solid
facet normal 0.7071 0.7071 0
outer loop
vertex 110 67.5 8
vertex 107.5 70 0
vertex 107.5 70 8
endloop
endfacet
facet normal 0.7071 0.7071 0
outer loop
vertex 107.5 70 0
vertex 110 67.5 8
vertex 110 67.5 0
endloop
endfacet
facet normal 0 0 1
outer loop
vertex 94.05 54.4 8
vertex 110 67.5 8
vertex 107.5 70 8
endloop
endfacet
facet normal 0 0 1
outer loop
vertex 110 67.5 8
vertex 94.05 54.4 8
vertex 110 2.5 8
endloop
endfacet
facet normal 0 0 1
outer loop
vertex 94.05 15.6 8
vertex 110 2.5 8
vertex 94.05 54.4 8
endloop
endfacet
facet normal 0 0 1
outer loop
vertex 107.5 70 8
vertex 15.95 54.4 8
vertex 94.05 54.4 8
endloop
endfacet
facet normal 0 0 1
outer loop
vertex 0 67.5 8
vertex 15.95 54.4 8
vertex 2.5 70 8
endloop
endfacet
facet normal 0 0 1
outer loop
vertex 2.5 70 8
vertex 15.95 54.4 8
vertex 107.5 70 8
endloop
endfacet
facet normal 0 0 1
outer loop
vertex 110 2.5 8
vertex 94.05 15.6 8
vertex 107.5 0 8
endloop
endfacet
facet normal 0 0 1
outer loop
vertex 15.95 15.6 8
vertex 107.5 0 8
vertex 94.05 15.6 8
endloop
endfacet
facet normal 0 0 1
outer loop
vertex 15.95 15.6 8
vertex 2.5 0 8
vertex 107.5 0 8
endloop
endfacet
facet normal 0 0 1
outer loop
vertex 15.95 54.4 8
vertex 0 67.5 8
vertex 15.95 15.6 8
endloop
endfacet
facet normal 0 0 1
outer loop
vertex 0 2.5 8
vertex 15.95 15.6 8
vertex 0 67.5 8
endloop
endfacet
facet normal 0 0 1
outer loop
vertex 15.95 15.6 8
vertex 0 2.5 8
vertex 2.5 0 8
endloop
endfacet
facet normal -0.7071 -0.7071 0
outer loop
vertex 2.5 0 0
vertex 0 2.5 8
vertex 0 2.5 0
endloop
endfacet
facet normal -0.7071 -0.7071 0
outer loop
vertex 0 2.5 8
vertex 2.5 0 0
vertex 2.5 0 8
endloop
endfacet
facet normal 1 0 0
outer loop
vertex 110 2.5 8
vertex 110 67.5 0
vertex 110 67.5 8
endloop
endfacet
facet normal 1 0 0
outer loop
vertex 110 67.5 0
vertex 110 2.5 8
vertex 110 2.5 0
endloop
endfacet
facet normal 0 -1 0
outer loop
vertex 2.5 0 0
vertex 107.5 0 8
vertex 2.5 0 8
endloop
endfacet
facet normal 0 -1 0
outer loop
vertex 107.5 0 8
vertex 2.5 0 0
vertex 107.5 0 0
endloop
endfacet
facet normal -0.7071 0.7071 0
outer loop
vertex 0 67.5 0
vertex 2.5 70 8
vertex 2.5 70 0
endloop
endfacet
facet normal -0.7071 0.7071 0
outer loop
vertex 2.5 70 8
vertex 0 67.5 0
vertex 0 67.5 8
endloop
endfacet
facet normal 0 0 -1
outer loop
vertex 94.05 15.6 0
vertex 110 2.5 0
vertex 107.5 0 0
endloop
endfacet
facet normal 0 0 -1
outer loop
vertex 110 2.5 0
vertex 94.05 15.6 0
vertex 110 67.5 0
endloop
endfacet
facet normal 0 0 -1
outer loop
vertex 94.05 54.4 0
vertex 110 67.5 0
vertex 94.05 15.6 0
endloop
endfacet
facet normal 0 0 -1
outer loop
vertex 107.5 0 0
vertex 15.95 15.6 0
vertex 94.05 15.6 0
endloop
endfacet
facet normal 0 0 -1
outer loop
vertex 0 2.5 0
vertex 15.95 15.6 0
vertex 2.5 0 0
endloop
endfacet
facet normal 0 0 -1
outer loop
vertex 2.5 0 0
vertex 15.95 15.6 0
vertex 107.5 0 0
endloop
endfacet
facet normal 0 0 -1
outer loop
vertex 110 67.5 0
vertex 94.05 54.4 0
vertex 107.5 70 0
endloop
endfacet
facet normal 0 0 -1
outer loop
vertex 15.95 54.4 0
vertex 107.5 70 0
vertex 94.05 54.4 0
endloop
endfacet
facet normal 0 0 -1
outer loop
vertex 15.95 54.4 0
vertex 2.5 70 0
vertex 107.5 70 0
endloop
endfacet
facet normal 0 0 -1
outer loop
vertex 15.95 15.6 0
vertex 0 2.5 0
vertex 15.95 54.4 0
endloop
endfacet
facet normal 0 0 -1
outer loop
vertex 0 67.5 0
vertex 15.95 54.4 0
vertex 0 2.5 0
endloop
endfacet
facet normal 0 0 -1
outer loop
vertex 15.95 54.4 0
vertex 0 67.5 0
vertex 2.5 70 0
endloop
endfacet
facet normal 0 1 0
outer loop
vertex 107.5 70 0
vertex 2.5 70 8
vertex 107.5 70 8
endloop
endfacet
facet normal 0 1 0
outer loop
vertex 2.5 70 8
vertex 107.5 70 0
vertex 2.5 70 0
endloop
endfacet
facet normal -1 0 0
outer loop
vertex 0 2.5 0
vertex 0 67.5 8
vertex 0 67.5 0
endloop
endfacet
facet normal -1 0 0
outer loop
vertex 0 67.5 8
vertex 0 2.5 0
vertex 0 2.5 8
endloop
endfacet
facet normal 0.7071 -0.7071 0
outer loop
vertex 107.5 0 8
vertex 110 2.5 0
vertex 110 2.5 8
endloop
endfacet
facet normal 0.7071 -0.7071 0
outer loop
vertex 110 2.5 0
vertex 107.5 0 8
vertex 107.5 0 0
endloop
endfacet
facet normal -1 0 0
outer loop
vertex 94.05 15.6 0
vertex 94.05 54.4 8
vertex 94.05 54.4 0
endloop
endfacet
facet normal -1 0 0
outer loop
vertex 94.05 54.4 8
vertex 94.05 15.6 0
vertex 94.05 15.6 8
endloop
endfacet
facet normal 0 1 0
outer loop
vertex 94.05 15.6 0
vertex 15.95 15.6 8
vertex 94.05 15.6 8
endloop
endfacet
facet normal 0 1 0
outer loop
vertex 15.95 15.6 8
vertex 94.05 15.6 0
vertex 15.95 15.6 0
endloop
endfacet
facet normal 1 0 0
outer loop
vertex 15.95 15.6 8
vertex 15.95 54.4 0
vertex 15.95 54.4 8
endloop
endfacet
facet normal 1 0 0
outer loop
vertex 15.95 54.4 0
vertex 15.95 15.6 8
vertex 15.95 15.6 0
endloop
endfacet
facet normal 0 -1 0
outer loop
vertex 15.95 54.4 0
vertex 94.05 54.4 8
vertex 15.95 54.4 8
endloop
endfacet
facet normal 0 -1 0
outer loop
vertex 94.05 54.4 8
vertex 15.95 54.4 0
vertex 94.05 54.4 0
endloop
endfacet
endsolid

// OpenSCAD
$fn = 32;

// ----------------------------------------------------------------------
// Windowed plate: 1 voids, 110 x 70 x 8 mm
// ----------------------------------------------------------------------

// --- parameters (mm) ---
plate_l = 110;            // plate length, X
plate_w = 70;             // plate width, Y
plate_t = 8;              // plate thickness, Z
edge_margin = 10;         // wall from the plate edge to any window
win1_l = 78.1;            // window length
win1_w = 38.8;            // window width
depth_1 = 8;              // depth of void 1 (full thickness = through)
corner_c = 2.5;           // corner chamfer of the plate

profile = [[2.5, 0], [107.5, 0], [110, 2.5], [110, 67.5], [107.5, 70], [2.5, 70], [0, 67.5], [0, 2.5]];  // primary outline, 8 points, counter clockwise
void_1 = [[15.95, 15.6], [94.05, 15.6], [94.05, 54.4], [15.95, 54.4]];  // large central window, 4 points

// --- the one profile operation ---
difference() {
  linear_extrude(height = plate_t) polygon(points = profile);
  translate([0, 0, -1])
    linear_extrude(height = plate_t + 2) polygon(points = void_1);
}
